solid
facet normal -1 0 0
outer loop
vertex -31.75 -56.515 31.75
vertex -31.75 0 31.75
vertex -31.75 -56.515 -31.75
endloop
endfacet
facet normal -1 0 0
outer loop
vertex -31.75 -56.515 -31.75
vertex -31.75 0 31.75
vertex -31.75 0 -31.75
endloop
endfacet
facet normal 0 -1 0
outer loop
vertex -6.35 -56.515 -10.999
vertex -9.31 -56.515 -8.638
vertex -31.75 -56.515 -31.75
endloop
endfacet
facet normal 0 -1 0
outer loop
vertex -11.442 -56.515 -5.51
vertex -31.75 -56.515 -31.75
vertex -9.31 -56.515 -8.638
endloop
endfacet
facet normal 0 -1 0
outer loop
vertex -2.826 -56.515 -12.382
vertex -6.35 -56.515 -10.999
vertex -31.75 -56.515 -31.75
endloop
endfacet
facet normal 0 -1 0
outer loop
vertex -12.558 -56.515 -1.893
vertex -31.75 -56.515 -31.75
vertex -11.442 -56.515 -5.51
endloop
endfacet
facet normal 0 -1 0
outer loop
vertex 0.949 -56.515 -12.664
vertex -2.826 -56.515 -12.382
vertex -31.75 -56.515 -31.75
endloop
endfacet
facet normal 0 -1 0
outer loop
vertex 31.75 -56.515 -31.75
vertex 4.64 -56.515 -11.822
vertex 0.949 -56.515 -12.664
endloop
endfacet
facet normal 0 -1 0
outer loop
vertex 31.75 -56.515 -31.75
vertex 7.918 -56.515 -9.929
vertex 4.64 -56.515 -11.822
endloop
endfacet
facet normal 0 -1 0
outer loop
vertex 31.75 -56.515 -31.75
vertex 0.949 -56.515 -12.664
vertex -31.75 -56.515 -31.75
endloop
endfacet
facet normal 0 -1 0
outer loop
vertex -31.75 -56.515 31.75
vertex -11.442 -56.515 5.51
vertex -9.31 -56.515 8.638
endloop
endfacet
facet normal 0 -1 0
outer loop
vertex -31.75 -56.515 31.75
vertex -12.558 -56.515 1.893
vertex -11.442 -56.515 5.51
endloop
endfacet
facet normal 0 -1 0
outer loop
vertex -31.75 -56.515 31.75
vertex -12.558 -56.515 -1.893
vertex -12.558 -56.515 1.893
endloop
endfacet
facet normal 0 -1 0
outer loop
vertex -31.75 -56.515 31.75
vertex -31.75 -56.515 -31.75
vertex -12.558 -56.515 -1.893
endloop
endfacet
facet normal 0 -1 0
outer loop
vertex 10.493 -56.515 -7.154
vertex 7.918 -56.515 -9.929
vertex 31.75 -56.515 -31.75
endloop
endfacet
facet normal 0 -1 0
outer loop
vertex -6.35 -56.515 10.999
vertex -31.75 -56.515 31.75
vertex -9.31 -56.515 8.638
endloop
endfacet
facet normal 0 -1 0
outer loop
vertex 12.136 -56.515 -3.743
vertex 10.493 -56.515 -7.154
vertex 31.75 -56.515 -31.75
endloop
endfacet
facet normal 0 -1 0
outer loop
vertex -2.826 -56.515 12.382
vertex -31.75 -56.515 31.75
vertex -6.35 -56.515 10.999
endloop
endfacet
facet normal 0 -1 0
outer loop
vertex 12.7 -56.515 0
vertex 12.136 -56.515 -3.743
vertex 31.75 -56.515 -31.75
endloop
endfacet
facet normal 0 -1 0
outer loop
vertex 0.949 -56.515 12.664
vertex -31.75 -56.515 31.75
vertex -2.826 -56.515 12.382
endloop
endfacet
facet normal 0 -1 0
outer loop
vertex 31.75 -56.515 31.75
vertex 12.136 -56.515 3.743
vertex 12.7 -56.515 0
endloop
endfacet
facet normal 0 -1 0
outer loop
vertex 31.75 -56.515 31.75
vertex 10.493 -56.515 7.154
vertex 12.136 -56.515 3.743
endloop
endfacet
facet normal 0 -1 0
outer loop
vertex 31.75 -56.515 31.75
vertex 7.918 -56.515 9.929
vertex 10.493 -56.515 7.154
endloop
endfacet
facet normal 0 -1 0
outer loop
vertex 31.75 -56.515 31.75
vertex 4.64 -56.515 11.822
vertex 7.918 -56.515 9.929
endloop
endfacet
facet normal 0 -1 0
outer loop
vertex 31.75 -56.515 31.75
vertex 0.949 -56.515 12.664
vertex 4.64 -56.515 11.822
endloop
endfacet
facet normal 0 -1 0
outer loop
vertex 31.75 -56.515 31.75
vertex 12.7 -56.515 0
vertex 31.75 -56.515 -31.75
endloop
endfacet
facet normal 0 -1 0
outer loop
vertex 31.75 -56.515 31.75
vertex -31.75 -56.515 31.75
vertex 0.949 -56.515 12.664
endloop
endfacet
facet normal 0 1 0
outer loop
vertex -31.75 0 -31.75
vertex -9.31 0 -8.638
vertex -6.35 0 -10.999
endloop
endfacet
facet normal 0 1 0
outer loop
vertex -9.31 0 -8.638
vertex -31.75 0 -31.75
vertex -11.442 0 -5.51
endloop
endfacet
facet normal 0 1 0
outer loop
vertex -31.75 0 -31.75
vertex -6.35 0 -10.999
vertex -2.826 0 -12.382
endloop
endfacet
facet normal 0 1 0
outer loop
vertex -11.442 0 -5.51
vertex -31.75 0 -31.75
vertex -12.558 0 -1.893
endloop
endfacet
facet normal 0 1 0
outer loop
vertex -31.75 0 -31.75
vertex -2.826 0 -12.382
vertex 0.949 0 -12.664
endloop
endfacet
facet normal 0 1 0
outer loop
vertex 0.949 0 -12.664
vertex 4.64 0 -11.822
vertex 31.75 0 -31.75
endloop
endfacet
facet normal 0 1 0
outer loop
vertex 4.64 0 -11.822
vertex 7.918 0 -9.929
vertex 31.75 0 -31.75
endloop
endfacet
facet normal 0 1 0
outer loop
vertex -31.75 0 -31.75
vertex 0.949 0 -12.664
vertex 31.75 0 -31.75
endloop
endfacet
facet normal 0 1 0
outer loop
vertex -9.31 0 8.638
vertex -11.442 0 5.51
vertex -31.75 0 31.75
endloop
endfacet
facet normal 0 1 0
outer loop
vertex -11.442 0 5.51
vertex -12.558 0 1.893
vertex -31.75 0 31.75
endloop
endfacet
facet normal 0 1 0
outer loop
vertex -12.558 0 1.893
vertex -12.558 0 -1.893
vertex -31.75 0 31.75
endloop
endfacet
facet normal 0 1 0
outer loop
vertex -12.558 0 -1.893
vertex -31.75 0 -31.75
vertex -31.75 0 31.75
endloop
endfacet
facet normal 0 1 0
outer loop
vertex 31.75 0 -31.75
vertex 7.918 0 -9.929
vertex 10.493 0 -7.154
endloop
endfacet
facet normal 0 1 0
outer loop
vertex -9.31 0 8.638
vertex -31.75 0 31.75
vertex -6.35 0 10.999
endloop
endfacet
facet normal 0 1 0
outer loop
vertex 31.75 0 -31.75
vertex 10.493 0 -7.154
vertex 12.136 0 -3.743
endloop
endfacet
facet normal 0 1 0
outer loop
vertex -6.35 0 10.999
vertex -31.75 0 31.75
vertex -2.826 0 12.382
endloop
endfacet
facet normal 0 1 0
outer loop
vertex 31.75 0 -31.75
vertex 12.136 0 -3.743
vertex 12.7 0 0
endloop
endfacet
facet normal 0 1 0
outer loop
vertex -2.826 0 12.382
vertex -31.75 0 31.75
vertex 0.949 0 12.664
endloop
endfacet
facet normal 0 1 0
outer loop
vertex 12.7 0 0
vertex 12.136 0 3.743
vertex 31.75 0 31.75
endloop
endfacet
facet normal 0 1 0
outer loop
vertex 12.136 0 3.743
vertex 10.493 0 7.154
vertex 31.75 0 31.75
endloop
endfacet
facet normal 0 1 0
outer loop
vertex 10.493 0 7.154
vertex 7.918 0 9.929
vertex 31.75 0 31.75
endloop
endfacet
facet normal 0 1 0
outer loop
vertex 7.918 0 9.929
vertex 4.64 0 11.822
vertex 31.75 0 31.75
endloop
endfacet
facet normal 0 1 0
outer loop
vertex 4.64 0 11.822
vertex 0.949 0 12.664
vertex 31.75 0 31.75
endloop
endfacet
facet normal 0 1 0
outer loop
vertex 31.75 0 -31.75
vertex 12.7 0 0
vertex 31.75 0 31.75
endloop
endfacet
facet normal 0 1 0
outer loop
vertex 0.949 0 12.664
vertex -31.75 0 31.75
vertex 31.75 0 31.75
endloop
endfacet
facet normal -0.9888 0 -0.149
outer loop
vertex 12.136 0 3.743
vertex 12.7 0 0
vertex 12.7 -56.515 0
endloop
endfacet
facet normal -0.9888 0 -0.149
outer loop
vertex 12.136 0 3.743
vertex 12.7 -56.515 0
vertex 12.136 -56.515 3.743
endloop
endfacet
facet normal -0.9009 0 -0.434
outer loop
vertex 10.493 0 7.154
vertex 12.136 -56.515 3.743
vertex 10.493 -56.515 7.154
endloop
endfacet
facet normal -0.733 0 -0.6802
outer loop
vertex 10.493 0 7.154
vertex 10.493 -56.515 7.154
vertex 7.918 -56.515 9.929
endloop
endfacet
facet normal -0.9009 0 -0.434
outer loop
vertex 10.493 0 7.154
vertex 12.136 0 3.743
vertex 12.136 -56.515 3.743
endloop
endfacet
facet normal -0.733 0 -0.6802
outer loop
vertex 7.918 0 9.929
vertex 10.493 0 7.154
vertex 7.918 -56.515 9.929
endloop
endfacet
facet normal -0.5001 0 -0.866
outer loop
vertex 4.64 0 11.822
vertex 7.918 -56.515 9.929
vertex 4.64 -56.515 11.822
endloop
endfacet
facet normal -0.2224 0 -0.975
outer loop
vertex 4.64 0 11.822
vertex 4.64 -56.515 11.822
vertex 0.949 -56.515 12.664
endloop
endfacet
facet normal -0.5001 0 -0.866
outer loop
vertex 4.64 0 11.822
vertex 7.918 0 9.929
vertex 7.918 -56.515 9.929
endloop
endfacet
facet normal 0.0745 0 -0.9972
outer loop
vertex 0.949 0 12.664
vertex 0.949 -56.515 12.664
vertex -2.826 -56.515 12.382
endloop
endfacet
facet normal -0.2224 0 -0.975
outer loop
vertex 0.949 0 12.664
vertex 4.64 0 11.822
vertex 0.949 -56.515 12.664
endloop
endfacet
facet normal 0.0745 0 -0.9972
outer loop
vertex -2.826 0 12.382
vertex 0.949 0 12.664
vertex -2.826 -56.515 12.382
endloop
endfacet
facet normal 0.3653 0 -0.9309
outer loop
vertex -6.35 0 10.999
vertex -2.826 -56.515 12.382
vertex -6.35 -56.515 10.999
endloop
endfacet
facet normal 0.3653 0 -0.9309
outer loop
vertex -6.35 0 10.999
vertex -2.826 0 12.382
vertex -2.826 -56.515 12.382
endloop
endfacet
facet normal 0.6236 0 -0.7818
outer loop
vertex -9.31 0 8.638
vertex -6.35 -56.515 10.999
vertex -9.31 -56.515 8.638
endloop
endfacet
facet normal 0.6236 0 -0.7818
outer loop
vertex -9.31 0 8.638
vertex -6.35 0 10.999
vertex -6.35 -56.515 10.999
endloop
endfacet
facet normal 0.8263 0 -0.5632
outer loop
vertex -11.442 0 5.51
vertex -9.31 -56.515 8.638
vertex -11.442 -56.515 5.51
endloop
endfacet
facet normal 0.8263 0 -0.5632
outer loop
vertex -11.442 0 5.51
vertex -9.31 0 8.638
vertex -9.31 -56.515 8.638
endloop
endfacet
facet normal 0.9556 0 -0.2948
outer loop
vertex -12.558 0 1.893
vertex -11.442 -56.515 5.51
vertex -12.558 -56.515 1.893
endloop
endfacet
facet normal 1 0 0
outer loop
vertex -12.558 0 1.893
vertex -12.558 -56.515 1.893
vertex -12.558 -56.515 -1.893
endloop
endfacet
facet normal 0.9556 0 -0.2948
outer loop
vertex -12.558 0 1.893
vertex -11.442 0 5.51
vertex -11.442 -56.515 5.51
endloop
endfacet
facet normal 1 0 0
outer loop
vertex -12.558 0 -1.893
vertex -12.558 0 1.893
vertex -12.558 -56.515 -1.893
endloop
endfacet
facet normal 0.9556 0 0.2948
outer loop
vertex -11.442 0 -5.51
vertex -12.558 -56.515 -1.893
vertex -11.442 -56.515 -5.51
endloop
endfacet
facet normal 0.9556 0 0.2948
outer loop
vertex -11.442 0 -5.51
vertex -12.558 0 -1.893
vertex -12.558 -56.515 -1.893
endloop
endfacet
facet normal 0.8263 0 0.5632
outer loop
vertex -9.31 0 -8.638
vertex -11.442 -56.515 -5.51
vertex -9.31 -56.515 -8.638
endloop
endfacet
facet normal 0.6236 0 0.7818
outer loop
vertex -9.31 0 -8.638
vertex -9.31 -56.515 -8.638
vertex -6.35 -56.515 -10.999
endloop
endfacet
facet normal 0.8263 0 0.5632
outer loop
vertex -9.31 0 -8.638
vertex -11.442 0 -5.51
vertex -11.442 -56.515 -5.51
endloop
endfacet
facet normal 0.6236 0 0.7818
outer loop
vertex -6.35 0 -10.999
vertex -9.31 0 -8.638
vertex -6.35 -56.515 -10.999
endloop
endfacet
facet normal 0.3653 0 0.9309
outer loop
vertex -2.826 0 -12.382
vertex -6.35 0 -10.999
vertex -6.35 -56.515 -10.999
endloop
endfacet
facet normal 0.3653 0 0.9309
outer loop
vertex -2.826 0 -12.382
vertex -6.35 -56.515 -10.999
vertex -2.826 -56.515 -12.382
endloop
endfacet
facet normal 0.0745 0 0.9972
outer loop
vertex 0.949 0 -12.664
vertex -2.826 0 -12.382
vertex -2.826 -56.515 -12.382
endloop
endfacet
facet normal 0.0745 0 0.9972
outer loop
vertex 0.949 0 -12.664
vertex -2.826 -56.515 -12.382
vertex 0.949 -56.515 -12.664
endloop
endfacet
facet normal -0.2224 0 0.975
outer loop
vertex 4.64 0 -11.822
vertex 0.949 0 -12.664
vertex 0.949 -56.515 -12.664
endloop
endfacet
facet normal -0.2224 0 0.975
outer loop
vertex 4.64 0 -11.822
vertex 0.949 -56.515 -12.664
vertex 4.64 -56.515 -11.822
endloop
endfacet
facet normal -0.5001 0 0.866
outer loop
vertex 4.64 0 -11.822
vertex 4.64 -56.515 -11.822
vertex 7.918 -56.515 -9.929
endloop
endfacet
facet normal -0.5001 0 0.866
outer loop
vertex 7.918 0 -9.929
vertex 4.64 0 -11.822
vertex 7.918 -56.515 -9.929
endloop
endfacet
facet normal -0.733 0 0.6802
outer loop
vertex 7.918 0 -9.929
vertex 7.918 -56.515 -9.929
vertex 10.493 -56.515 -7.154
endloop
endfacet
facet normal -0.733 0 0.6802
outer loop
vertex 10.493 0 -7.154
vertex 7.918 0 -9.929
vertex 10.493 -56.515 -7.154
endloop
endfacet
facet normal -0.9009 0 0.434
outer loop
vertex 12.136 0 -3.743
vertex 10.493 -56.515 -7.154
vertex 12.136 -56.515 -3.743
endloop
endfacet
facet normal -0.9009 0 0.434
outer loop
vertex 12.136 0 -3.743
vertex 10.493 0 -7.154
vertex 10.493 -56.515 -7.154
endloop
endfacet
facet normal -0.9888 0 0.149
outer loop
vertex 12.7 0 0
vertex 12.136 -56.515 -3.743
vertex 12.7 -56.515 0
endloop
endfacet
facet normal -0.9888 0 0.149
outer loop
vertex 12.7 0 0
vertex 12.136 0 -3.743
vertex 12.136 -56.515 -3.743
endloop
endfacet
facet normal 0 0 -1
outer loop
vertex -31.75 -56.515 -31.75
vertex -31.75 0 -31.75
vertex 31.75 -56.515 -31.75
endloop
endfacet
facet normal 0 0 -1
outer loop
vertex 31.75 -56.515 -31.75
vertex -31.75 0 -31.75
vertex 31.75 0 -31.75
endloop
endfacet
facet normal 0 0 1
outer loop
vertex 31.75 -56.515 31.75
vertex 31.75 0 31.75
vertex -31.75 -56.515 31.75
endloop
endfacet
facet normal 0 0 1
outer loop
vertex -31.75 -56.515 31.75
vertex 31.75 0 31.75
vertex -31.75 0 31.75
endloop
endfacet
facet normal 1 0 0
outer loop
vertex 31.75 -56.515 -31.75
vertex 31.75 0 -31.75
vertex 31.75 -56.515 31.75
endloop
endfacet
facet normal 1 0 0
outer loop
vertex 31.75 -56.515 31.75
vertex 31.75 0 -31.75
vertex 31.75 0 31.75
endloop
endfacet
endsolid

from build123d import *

# Parameters (mm, degrees)
F0_R     = 12.7
F1_DEPTH = 56.515


with BuildPart() as f1:
    # F0 (on Front) → F1 (new body)
    with BuildSketch(Plane.XZ):
        with BuildLine():
            ThreePointArc((-3.8e-08, -31.75), (22.4506402893, -22.4506403161), (31.75, 0))
            ThreePointArc((31.75, 0), (22.4506402996, 22.4506403057), (-8.6e-09, 31.75))
            ThreePointArc((-8.6e-09, 31.75), (-22.4506403095, 22.4506402959), (-31.75, -1.06e-08))
            ThreePointArc((-31.75, -1.06e-08), (-22.4506403123, -22.450640293), (-3.8e-08, -31.75))
        make_face()
        Circle(F0_R, mode=Mode.SUBTRACT)
        with BuildLine():
            Line((31.75, -31.75), (31.75, 0))
            ThreePointArc((31.75, 0), (22.4506402893, -22.4506403161), (-3.8e-08, -31.75))
            Line((-3.8e-08, -31.75), (31.75, -31.75))
        make_face()
        with BuildLine():
            ThreePointArc((-8.6e-09, 31.75), (22.4506402996, 22.4506403057), (31.75, 0))
            Line((31.75, 0), (31.75, 31.75))
            Line((31.75, 31.75), (-8.6e-09, 31.75))
        make_face()
        with BuildLine():
            ThreePointArc((-31.75, -1.06e-08), (-22.4506403095, 22.4506402959), (-8.6e-09, 31.75))
            Line((-8.6e-09, 31.75), (-31.75, 31.75))
            Line((-31.75, 31.75), (-31.75, -1.06e-08))
        make_face()
        with BuildLine():
            Line((-31.75, -31.75), (-3.8e-08, -31.75))
            ThreePointArc((-3.8e-08, -31.75), (-22.4506403123, -22.450640293), (-31.75, -1.06e-08))
            Line((-31.75, -1.06e-08), (-31.75, -31.75))
        make_face()
    extrude(amount=F1_DEPTH)


solid = f1.part
